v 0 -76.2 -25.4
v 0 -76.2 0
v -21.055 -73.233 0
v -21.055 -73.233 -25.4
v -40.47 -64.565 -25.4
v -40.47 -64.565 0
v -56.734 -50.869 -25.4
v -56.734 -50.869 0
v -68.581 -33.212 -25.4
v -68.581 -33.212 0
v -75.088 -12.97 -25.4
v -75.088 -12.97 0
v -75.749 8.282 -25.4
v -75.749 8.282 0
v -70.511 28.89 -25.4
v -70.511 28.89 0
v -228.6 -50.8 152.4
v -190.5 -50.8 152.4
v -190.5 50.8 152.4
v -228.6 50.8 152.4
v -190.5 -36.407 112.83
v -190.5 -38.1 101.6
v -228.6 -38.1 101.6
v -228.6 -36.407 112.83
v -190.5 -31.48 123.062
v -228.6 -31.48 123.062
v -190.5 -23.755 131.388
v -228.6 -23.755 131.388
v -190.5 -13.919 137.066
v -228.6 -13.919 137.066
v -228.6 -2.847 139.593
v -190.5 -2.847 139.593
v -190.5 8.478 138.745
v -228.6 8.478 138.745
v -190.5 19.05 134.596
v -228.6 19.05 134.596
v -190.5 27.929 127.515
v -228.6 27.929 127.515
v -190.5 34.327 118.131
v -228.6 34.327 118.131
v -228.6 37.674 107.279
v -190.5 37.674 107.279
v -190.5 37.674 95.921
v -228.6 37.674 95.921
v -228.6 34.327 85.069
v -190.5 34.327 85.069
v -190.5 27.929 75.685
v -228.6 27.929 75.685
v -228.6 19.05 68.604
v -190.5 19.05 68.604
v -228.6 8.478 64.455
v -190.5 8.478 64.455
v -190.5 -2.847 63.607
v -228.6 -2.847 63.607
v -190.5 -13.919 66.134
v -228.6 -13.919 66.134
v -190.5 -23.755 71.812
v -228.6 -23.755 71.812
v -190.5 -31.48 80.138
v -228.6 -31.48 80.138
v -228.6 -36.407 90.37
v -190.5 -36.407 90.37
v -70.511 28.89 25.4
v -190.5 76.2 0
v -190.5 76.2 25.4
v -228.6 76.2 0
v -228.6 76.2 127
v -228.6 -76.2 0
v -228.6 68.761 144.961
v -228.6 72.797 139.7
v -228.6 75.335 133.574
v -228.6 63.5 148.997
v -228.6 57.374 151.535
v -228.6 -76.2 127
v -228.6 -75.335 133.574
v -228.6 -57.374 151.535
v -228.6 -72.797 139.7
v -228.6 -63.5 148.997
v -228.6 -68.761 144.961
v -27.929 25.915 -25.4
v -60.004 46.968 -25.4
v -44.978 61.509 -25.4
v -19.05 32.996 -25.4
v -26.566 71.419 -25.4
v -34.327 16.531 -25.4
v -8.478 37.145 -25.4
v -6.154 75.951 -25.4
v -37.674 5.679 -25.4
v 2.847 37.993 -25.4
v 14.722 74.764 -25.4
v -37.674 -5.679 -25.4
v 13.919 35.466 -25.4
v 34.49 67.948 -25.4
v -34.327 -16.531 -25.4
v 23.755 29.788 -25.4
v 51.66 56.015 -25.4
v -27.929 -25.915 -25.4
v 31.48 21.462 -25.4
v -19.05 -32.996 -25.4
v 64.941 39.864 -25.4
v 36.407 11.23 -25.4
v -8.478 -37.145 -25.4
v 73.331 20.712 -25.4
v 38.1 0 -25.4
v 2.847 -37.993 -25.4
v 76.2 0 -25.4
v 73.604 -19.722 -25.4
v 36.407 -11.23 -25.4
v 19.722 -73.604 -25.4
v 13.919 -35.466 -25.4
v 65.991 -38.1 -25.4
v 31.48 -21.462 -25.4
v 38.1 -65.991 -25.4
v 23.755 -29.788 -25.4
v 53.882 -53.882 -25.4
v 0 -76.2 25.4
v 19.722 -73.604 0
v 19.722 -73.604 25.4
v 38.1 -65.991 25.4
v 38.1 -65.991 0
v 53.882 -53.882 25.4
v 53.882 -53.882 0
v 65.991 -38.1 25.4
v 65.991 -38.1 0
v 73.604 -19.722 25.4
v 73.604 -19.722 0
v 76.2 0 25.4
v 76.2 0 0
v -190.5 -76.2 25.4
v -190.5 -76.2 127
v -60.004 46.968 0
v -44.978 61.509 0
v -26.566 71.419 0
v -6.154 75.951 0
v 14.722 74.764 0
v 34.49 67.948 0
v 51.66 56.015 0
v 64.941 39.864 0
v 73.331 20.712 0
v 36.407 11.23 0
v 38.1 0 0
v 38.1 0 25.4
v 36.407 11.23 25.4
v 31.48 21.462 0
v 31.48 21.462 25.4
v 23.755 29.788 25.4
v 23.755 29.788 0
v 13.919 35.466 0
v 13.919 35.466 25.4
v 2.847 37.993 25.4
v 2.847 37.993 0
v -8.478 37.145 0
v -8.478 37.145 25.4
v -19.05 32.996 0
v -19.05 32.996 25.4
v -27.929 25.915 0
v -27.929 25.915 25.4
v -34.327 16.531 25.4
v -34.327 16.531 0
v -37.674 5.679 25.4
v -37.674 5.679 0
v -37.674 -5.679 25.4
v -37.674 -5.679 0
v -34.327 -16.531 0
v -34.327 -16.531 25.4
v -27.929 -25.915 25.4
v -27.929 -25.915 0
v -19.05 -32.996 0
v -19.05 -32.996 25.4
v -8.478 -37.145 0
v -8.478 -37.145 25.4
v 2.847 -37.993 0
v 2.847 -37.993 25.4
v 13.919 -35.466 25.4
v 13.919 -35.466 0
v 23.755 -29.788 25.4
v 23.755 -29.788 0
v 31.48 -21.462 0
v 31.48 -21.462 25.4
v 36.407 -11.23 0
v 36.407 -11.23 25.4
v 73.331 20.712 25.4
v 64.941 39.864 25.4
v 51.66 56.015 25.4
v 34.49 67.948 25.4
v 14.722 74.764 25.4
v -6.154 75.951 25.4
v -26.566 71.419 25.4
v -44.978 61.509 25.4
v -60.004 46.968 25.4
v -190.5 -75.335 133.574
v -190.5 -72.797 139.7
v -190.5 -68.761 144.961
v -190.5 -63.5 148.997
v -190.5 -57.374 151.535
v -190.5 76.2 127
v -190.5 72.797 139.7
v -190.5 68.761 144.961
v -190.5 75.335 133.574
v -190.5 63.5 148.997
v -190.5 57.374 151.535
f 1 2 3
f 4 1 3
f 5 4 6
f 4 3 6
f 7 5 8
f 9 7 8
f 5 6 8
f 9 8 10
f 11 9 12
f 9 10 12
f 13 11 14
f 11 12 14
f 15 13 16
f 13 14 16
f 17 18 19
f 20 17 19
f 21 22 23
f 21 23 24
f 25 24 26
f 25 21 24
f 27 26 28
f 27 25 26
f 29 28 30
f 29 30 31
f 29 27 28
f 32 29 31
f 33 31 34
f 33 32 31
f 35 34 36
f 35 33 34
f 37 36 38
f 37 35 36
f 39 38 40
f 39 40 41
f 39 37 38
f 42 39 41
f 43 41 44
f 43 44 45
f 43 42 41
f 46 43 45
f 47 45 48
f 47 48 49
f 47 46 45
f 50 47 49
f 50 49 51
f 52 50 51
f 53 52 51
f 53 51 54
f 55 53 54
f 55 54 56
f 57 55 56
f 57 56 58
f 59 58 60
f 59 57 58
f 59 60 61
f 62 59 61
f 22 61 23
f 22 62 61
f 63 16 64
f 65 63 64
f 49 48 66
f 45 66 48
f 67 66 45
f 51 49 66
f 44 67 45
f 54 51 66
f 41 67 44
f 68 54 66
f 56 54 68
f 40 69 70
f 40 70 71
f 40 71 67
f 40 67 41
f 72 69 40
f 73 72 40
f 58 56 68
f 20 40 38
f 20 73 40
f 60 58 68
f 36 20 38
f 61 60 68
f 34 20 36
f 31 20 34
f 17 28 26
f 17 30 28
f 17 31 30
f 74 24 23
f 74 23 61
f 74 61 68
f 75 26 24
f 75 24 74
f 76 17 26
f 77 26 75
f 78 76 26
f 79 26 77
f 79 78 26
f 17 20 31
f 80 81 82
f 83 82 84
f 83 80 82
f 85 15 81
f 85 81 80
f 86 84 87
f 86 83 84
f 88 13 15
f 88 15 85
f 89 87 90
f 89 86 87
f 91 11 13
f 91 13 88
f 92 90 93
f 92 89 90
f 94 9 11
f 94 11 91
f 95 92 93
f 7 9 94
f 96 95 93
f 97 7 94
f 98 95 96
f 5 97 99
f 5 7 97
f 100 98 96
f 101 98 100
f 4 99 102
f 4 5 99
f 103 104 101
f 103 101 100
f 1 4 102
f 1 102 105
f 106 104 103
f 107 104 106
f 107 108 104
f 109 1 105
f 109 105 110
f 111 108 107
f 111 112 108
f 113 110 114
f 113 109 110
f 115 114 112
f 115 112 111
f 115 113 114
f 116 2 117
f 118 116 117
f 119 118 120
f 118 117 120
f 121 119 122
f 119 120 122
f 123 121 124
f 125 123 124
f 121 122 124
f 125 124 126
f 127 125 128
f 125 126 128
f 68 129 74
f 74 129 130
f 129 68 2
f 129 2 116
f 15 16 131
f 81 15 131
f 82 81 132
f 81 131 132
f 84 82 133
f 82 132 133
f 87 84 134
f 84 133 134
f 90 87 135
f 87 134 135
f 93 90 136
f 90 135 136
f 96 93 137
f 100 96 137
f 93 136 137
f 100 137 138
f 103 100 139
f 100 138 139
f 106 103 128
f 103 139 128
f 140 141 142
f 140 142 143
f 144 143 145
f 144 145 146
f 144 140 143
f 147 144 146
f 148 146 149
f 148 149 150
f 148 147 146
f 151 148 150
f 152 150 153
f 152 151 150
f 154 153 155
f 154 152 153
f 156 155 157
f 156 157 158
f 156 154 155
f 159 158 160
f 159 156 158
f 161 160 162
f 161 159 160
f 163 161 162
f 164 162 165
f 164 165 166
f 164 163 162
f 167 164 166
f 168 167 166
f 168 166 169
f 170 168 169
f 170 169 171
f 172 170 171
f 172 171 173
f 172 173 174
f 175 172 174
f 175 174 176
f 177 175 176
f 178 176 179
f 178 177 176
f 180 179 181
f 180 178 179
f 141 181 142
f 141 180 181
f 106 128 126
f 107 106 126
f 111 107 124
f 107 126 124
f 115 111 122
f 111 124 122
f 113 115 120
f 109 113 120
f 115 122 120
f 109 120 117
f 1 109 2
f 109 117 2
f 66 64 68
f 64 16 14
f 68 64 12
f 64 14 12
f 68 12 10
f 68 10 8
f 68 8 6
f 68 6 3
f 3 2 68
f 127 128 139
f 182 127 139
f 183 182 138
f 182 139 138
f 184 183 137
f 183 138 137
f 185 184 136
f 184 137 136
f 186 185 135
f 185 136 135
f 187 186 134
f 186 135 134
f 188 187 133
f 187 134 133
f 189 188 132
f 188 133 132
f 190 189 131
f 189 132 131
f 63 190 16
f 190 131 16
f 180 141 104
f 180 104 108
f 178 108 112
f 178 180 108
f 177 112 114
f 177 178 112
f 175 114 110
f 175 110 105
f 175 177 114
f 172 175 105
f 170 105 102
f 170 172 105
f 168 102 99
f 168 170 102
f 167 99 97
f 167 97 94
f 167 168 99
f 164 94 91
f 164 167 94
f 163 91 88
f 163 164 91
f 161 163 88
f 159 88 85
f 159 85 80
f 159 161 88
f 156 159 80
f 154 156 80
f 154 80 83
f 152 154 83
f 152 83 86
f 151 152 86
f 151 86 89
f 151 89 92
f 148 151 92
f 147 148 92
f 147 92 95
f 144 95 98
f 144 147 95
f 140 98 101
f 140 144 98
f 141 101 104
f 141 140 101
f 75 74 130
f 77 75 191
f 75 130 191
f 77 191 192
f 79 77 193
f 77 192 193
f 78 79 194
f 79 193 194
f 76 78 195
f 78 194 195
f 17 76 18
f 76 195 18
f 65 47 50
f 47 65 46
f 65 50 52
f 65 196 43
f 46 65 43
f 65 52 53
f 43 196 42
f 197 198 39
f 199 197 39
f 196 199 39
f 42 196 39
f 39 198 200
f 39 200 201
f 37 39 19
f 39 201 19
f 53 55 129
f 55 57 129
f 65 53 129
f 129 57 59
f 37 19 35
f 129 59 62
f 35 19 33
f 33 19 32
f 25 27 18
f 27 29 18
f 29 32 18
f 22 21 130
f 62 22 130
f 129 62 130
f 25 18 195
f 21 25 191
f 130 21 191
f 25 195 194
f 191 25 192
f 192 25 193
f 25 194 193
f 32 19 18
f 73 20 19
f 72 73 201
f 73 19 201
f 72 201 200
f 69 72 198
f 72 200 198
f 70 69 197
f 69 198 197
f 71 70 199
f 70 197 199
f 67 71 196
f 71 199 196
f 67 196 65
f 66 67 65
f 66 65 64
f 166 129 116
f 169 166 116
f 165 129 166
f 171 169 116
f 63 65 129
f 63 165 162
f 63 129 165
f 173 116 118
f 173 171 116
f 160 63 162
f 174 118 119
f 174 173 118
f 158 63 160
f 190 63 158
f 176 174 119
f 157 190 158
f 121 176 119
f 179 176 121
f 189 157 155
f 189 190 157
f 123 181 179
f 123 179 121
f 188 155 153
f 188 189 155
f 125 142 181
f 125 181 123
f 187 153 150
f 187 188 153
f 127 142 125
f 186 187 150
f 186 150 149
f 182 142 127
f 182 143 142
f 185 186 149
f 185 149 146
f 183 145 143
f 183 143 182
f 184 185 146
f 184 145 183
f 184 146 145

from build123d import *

# Parameters (mm, degrees)
F0_R     = 38.1
F1_DEPTH = 25.4
F2_R     = 38.1
F3_DEPTH = 25.4
F4_R     = 38.1
F5_DEPTH = 38.1


with BuildPart() as f1:
    # F0 (on Top) → F1 (new body)
    with BuildSketch(Plane.XY):
        with BuildLine():
            ThreePointArc((0, -76.2), (53.8815367264, -53.8815367264), (76.2, 0))
            ThreePointArc((76.2, 0), (14.7223801552, 74.7642395973), (-70.5110635844, 28.8899621357))
            ThreePointArc((-70.5110635844, 28.8899621357), (-63.2765956525, -42.4560059665), (0, -76.2))
        make_face()
        Circle(F0_R, mode=Mode.SUBTRACT)
        with BuildLine():
            ThreePointArc((0, -76.2), (-63.2765956525, -42.4560059665), (-70.5110635844, 28.8899621357))
            Line((-70.5110635844, 28.8899621357), (-190.5, 76.2))
            Line((-190.5, 76.2), (-190.5, -76.2))
            Line((-190.5, -76.2), (0, -76.2))
        make_face()
    extrude(amount=F1_DEPTH)

    # F2 (on face) → F3 (join)
    with BuildSketch(Plane(origin=(0, 0, 0), x_dir=(1, 0, 0), z_dir=(0, 0, -1))):
        with BuildLine():
            ThreePointArc((-70.5110635844, -28.8899621357), (14.7223801552, -74.7642395973), (76.2, 0))
            ThreePointArc((76.2, 0), (53.8815367264, 53.8815367264), (0, 76.2))
            ThreePointArc((0, 76.2), (-63.2765956525, 42.4560059665), (-70.5110635844, -28.8899621357))
        make_face()
        Circle(F2_R, mode=Mode.SUBTRACT)
    extrude(amount=F3_DEPTH)

    # F4 (on face) → F5 (join)
    with BuildSketch(Plane(origin=(-190.5, 0, 0), x_dir=(0, -1, 0), z_dir=(-1, 0, 0))):
        with BuildLine():
            Line((-76.2, 0), (76.2, 0))
            Line((76.2, 0), (76.2, 127))
            ThreePointArc((76.2, 127), (68.7605122421, 144.9605122421), (50.8, 152.4))
            Line((50.8, 152.4), (-50.8, 152.4))
            ThreePointArc((-50.8, 152.4), (-68.7605122421, 144.9605122421), (-76.2, 127))
            Line((-76.2, 127), (-76.2, 0))
        make_face()
        with Locations((0, 101.6)):
            Circle(F4_R, mode=Mode.SUBTRACT)
        with BuildLine():
            Line((-76.2, 25.4), (76.2, 25.4))
            Line((76.2, 25.4), (76.2, 127))
            ThreePointArc((76.2, 127), (68.7605122421, 144.9605122421), (50.8, 152.4))
            Line((50.8, 152.4), (-50.8, 152.4))
            ThreePointArc((-50.8, 152.4), (-68.7605122421, 144.9605122421), (-76.2, 127))
            Line((-76.2, 127), (-76.2, 25.4))
        make_face()
        with Locations((0, 101.6)):
            Circle(F4_R, mode=Mode.SUBTRACT)
    extrude(amount=F5_DEPTH)


solid = f1.part
